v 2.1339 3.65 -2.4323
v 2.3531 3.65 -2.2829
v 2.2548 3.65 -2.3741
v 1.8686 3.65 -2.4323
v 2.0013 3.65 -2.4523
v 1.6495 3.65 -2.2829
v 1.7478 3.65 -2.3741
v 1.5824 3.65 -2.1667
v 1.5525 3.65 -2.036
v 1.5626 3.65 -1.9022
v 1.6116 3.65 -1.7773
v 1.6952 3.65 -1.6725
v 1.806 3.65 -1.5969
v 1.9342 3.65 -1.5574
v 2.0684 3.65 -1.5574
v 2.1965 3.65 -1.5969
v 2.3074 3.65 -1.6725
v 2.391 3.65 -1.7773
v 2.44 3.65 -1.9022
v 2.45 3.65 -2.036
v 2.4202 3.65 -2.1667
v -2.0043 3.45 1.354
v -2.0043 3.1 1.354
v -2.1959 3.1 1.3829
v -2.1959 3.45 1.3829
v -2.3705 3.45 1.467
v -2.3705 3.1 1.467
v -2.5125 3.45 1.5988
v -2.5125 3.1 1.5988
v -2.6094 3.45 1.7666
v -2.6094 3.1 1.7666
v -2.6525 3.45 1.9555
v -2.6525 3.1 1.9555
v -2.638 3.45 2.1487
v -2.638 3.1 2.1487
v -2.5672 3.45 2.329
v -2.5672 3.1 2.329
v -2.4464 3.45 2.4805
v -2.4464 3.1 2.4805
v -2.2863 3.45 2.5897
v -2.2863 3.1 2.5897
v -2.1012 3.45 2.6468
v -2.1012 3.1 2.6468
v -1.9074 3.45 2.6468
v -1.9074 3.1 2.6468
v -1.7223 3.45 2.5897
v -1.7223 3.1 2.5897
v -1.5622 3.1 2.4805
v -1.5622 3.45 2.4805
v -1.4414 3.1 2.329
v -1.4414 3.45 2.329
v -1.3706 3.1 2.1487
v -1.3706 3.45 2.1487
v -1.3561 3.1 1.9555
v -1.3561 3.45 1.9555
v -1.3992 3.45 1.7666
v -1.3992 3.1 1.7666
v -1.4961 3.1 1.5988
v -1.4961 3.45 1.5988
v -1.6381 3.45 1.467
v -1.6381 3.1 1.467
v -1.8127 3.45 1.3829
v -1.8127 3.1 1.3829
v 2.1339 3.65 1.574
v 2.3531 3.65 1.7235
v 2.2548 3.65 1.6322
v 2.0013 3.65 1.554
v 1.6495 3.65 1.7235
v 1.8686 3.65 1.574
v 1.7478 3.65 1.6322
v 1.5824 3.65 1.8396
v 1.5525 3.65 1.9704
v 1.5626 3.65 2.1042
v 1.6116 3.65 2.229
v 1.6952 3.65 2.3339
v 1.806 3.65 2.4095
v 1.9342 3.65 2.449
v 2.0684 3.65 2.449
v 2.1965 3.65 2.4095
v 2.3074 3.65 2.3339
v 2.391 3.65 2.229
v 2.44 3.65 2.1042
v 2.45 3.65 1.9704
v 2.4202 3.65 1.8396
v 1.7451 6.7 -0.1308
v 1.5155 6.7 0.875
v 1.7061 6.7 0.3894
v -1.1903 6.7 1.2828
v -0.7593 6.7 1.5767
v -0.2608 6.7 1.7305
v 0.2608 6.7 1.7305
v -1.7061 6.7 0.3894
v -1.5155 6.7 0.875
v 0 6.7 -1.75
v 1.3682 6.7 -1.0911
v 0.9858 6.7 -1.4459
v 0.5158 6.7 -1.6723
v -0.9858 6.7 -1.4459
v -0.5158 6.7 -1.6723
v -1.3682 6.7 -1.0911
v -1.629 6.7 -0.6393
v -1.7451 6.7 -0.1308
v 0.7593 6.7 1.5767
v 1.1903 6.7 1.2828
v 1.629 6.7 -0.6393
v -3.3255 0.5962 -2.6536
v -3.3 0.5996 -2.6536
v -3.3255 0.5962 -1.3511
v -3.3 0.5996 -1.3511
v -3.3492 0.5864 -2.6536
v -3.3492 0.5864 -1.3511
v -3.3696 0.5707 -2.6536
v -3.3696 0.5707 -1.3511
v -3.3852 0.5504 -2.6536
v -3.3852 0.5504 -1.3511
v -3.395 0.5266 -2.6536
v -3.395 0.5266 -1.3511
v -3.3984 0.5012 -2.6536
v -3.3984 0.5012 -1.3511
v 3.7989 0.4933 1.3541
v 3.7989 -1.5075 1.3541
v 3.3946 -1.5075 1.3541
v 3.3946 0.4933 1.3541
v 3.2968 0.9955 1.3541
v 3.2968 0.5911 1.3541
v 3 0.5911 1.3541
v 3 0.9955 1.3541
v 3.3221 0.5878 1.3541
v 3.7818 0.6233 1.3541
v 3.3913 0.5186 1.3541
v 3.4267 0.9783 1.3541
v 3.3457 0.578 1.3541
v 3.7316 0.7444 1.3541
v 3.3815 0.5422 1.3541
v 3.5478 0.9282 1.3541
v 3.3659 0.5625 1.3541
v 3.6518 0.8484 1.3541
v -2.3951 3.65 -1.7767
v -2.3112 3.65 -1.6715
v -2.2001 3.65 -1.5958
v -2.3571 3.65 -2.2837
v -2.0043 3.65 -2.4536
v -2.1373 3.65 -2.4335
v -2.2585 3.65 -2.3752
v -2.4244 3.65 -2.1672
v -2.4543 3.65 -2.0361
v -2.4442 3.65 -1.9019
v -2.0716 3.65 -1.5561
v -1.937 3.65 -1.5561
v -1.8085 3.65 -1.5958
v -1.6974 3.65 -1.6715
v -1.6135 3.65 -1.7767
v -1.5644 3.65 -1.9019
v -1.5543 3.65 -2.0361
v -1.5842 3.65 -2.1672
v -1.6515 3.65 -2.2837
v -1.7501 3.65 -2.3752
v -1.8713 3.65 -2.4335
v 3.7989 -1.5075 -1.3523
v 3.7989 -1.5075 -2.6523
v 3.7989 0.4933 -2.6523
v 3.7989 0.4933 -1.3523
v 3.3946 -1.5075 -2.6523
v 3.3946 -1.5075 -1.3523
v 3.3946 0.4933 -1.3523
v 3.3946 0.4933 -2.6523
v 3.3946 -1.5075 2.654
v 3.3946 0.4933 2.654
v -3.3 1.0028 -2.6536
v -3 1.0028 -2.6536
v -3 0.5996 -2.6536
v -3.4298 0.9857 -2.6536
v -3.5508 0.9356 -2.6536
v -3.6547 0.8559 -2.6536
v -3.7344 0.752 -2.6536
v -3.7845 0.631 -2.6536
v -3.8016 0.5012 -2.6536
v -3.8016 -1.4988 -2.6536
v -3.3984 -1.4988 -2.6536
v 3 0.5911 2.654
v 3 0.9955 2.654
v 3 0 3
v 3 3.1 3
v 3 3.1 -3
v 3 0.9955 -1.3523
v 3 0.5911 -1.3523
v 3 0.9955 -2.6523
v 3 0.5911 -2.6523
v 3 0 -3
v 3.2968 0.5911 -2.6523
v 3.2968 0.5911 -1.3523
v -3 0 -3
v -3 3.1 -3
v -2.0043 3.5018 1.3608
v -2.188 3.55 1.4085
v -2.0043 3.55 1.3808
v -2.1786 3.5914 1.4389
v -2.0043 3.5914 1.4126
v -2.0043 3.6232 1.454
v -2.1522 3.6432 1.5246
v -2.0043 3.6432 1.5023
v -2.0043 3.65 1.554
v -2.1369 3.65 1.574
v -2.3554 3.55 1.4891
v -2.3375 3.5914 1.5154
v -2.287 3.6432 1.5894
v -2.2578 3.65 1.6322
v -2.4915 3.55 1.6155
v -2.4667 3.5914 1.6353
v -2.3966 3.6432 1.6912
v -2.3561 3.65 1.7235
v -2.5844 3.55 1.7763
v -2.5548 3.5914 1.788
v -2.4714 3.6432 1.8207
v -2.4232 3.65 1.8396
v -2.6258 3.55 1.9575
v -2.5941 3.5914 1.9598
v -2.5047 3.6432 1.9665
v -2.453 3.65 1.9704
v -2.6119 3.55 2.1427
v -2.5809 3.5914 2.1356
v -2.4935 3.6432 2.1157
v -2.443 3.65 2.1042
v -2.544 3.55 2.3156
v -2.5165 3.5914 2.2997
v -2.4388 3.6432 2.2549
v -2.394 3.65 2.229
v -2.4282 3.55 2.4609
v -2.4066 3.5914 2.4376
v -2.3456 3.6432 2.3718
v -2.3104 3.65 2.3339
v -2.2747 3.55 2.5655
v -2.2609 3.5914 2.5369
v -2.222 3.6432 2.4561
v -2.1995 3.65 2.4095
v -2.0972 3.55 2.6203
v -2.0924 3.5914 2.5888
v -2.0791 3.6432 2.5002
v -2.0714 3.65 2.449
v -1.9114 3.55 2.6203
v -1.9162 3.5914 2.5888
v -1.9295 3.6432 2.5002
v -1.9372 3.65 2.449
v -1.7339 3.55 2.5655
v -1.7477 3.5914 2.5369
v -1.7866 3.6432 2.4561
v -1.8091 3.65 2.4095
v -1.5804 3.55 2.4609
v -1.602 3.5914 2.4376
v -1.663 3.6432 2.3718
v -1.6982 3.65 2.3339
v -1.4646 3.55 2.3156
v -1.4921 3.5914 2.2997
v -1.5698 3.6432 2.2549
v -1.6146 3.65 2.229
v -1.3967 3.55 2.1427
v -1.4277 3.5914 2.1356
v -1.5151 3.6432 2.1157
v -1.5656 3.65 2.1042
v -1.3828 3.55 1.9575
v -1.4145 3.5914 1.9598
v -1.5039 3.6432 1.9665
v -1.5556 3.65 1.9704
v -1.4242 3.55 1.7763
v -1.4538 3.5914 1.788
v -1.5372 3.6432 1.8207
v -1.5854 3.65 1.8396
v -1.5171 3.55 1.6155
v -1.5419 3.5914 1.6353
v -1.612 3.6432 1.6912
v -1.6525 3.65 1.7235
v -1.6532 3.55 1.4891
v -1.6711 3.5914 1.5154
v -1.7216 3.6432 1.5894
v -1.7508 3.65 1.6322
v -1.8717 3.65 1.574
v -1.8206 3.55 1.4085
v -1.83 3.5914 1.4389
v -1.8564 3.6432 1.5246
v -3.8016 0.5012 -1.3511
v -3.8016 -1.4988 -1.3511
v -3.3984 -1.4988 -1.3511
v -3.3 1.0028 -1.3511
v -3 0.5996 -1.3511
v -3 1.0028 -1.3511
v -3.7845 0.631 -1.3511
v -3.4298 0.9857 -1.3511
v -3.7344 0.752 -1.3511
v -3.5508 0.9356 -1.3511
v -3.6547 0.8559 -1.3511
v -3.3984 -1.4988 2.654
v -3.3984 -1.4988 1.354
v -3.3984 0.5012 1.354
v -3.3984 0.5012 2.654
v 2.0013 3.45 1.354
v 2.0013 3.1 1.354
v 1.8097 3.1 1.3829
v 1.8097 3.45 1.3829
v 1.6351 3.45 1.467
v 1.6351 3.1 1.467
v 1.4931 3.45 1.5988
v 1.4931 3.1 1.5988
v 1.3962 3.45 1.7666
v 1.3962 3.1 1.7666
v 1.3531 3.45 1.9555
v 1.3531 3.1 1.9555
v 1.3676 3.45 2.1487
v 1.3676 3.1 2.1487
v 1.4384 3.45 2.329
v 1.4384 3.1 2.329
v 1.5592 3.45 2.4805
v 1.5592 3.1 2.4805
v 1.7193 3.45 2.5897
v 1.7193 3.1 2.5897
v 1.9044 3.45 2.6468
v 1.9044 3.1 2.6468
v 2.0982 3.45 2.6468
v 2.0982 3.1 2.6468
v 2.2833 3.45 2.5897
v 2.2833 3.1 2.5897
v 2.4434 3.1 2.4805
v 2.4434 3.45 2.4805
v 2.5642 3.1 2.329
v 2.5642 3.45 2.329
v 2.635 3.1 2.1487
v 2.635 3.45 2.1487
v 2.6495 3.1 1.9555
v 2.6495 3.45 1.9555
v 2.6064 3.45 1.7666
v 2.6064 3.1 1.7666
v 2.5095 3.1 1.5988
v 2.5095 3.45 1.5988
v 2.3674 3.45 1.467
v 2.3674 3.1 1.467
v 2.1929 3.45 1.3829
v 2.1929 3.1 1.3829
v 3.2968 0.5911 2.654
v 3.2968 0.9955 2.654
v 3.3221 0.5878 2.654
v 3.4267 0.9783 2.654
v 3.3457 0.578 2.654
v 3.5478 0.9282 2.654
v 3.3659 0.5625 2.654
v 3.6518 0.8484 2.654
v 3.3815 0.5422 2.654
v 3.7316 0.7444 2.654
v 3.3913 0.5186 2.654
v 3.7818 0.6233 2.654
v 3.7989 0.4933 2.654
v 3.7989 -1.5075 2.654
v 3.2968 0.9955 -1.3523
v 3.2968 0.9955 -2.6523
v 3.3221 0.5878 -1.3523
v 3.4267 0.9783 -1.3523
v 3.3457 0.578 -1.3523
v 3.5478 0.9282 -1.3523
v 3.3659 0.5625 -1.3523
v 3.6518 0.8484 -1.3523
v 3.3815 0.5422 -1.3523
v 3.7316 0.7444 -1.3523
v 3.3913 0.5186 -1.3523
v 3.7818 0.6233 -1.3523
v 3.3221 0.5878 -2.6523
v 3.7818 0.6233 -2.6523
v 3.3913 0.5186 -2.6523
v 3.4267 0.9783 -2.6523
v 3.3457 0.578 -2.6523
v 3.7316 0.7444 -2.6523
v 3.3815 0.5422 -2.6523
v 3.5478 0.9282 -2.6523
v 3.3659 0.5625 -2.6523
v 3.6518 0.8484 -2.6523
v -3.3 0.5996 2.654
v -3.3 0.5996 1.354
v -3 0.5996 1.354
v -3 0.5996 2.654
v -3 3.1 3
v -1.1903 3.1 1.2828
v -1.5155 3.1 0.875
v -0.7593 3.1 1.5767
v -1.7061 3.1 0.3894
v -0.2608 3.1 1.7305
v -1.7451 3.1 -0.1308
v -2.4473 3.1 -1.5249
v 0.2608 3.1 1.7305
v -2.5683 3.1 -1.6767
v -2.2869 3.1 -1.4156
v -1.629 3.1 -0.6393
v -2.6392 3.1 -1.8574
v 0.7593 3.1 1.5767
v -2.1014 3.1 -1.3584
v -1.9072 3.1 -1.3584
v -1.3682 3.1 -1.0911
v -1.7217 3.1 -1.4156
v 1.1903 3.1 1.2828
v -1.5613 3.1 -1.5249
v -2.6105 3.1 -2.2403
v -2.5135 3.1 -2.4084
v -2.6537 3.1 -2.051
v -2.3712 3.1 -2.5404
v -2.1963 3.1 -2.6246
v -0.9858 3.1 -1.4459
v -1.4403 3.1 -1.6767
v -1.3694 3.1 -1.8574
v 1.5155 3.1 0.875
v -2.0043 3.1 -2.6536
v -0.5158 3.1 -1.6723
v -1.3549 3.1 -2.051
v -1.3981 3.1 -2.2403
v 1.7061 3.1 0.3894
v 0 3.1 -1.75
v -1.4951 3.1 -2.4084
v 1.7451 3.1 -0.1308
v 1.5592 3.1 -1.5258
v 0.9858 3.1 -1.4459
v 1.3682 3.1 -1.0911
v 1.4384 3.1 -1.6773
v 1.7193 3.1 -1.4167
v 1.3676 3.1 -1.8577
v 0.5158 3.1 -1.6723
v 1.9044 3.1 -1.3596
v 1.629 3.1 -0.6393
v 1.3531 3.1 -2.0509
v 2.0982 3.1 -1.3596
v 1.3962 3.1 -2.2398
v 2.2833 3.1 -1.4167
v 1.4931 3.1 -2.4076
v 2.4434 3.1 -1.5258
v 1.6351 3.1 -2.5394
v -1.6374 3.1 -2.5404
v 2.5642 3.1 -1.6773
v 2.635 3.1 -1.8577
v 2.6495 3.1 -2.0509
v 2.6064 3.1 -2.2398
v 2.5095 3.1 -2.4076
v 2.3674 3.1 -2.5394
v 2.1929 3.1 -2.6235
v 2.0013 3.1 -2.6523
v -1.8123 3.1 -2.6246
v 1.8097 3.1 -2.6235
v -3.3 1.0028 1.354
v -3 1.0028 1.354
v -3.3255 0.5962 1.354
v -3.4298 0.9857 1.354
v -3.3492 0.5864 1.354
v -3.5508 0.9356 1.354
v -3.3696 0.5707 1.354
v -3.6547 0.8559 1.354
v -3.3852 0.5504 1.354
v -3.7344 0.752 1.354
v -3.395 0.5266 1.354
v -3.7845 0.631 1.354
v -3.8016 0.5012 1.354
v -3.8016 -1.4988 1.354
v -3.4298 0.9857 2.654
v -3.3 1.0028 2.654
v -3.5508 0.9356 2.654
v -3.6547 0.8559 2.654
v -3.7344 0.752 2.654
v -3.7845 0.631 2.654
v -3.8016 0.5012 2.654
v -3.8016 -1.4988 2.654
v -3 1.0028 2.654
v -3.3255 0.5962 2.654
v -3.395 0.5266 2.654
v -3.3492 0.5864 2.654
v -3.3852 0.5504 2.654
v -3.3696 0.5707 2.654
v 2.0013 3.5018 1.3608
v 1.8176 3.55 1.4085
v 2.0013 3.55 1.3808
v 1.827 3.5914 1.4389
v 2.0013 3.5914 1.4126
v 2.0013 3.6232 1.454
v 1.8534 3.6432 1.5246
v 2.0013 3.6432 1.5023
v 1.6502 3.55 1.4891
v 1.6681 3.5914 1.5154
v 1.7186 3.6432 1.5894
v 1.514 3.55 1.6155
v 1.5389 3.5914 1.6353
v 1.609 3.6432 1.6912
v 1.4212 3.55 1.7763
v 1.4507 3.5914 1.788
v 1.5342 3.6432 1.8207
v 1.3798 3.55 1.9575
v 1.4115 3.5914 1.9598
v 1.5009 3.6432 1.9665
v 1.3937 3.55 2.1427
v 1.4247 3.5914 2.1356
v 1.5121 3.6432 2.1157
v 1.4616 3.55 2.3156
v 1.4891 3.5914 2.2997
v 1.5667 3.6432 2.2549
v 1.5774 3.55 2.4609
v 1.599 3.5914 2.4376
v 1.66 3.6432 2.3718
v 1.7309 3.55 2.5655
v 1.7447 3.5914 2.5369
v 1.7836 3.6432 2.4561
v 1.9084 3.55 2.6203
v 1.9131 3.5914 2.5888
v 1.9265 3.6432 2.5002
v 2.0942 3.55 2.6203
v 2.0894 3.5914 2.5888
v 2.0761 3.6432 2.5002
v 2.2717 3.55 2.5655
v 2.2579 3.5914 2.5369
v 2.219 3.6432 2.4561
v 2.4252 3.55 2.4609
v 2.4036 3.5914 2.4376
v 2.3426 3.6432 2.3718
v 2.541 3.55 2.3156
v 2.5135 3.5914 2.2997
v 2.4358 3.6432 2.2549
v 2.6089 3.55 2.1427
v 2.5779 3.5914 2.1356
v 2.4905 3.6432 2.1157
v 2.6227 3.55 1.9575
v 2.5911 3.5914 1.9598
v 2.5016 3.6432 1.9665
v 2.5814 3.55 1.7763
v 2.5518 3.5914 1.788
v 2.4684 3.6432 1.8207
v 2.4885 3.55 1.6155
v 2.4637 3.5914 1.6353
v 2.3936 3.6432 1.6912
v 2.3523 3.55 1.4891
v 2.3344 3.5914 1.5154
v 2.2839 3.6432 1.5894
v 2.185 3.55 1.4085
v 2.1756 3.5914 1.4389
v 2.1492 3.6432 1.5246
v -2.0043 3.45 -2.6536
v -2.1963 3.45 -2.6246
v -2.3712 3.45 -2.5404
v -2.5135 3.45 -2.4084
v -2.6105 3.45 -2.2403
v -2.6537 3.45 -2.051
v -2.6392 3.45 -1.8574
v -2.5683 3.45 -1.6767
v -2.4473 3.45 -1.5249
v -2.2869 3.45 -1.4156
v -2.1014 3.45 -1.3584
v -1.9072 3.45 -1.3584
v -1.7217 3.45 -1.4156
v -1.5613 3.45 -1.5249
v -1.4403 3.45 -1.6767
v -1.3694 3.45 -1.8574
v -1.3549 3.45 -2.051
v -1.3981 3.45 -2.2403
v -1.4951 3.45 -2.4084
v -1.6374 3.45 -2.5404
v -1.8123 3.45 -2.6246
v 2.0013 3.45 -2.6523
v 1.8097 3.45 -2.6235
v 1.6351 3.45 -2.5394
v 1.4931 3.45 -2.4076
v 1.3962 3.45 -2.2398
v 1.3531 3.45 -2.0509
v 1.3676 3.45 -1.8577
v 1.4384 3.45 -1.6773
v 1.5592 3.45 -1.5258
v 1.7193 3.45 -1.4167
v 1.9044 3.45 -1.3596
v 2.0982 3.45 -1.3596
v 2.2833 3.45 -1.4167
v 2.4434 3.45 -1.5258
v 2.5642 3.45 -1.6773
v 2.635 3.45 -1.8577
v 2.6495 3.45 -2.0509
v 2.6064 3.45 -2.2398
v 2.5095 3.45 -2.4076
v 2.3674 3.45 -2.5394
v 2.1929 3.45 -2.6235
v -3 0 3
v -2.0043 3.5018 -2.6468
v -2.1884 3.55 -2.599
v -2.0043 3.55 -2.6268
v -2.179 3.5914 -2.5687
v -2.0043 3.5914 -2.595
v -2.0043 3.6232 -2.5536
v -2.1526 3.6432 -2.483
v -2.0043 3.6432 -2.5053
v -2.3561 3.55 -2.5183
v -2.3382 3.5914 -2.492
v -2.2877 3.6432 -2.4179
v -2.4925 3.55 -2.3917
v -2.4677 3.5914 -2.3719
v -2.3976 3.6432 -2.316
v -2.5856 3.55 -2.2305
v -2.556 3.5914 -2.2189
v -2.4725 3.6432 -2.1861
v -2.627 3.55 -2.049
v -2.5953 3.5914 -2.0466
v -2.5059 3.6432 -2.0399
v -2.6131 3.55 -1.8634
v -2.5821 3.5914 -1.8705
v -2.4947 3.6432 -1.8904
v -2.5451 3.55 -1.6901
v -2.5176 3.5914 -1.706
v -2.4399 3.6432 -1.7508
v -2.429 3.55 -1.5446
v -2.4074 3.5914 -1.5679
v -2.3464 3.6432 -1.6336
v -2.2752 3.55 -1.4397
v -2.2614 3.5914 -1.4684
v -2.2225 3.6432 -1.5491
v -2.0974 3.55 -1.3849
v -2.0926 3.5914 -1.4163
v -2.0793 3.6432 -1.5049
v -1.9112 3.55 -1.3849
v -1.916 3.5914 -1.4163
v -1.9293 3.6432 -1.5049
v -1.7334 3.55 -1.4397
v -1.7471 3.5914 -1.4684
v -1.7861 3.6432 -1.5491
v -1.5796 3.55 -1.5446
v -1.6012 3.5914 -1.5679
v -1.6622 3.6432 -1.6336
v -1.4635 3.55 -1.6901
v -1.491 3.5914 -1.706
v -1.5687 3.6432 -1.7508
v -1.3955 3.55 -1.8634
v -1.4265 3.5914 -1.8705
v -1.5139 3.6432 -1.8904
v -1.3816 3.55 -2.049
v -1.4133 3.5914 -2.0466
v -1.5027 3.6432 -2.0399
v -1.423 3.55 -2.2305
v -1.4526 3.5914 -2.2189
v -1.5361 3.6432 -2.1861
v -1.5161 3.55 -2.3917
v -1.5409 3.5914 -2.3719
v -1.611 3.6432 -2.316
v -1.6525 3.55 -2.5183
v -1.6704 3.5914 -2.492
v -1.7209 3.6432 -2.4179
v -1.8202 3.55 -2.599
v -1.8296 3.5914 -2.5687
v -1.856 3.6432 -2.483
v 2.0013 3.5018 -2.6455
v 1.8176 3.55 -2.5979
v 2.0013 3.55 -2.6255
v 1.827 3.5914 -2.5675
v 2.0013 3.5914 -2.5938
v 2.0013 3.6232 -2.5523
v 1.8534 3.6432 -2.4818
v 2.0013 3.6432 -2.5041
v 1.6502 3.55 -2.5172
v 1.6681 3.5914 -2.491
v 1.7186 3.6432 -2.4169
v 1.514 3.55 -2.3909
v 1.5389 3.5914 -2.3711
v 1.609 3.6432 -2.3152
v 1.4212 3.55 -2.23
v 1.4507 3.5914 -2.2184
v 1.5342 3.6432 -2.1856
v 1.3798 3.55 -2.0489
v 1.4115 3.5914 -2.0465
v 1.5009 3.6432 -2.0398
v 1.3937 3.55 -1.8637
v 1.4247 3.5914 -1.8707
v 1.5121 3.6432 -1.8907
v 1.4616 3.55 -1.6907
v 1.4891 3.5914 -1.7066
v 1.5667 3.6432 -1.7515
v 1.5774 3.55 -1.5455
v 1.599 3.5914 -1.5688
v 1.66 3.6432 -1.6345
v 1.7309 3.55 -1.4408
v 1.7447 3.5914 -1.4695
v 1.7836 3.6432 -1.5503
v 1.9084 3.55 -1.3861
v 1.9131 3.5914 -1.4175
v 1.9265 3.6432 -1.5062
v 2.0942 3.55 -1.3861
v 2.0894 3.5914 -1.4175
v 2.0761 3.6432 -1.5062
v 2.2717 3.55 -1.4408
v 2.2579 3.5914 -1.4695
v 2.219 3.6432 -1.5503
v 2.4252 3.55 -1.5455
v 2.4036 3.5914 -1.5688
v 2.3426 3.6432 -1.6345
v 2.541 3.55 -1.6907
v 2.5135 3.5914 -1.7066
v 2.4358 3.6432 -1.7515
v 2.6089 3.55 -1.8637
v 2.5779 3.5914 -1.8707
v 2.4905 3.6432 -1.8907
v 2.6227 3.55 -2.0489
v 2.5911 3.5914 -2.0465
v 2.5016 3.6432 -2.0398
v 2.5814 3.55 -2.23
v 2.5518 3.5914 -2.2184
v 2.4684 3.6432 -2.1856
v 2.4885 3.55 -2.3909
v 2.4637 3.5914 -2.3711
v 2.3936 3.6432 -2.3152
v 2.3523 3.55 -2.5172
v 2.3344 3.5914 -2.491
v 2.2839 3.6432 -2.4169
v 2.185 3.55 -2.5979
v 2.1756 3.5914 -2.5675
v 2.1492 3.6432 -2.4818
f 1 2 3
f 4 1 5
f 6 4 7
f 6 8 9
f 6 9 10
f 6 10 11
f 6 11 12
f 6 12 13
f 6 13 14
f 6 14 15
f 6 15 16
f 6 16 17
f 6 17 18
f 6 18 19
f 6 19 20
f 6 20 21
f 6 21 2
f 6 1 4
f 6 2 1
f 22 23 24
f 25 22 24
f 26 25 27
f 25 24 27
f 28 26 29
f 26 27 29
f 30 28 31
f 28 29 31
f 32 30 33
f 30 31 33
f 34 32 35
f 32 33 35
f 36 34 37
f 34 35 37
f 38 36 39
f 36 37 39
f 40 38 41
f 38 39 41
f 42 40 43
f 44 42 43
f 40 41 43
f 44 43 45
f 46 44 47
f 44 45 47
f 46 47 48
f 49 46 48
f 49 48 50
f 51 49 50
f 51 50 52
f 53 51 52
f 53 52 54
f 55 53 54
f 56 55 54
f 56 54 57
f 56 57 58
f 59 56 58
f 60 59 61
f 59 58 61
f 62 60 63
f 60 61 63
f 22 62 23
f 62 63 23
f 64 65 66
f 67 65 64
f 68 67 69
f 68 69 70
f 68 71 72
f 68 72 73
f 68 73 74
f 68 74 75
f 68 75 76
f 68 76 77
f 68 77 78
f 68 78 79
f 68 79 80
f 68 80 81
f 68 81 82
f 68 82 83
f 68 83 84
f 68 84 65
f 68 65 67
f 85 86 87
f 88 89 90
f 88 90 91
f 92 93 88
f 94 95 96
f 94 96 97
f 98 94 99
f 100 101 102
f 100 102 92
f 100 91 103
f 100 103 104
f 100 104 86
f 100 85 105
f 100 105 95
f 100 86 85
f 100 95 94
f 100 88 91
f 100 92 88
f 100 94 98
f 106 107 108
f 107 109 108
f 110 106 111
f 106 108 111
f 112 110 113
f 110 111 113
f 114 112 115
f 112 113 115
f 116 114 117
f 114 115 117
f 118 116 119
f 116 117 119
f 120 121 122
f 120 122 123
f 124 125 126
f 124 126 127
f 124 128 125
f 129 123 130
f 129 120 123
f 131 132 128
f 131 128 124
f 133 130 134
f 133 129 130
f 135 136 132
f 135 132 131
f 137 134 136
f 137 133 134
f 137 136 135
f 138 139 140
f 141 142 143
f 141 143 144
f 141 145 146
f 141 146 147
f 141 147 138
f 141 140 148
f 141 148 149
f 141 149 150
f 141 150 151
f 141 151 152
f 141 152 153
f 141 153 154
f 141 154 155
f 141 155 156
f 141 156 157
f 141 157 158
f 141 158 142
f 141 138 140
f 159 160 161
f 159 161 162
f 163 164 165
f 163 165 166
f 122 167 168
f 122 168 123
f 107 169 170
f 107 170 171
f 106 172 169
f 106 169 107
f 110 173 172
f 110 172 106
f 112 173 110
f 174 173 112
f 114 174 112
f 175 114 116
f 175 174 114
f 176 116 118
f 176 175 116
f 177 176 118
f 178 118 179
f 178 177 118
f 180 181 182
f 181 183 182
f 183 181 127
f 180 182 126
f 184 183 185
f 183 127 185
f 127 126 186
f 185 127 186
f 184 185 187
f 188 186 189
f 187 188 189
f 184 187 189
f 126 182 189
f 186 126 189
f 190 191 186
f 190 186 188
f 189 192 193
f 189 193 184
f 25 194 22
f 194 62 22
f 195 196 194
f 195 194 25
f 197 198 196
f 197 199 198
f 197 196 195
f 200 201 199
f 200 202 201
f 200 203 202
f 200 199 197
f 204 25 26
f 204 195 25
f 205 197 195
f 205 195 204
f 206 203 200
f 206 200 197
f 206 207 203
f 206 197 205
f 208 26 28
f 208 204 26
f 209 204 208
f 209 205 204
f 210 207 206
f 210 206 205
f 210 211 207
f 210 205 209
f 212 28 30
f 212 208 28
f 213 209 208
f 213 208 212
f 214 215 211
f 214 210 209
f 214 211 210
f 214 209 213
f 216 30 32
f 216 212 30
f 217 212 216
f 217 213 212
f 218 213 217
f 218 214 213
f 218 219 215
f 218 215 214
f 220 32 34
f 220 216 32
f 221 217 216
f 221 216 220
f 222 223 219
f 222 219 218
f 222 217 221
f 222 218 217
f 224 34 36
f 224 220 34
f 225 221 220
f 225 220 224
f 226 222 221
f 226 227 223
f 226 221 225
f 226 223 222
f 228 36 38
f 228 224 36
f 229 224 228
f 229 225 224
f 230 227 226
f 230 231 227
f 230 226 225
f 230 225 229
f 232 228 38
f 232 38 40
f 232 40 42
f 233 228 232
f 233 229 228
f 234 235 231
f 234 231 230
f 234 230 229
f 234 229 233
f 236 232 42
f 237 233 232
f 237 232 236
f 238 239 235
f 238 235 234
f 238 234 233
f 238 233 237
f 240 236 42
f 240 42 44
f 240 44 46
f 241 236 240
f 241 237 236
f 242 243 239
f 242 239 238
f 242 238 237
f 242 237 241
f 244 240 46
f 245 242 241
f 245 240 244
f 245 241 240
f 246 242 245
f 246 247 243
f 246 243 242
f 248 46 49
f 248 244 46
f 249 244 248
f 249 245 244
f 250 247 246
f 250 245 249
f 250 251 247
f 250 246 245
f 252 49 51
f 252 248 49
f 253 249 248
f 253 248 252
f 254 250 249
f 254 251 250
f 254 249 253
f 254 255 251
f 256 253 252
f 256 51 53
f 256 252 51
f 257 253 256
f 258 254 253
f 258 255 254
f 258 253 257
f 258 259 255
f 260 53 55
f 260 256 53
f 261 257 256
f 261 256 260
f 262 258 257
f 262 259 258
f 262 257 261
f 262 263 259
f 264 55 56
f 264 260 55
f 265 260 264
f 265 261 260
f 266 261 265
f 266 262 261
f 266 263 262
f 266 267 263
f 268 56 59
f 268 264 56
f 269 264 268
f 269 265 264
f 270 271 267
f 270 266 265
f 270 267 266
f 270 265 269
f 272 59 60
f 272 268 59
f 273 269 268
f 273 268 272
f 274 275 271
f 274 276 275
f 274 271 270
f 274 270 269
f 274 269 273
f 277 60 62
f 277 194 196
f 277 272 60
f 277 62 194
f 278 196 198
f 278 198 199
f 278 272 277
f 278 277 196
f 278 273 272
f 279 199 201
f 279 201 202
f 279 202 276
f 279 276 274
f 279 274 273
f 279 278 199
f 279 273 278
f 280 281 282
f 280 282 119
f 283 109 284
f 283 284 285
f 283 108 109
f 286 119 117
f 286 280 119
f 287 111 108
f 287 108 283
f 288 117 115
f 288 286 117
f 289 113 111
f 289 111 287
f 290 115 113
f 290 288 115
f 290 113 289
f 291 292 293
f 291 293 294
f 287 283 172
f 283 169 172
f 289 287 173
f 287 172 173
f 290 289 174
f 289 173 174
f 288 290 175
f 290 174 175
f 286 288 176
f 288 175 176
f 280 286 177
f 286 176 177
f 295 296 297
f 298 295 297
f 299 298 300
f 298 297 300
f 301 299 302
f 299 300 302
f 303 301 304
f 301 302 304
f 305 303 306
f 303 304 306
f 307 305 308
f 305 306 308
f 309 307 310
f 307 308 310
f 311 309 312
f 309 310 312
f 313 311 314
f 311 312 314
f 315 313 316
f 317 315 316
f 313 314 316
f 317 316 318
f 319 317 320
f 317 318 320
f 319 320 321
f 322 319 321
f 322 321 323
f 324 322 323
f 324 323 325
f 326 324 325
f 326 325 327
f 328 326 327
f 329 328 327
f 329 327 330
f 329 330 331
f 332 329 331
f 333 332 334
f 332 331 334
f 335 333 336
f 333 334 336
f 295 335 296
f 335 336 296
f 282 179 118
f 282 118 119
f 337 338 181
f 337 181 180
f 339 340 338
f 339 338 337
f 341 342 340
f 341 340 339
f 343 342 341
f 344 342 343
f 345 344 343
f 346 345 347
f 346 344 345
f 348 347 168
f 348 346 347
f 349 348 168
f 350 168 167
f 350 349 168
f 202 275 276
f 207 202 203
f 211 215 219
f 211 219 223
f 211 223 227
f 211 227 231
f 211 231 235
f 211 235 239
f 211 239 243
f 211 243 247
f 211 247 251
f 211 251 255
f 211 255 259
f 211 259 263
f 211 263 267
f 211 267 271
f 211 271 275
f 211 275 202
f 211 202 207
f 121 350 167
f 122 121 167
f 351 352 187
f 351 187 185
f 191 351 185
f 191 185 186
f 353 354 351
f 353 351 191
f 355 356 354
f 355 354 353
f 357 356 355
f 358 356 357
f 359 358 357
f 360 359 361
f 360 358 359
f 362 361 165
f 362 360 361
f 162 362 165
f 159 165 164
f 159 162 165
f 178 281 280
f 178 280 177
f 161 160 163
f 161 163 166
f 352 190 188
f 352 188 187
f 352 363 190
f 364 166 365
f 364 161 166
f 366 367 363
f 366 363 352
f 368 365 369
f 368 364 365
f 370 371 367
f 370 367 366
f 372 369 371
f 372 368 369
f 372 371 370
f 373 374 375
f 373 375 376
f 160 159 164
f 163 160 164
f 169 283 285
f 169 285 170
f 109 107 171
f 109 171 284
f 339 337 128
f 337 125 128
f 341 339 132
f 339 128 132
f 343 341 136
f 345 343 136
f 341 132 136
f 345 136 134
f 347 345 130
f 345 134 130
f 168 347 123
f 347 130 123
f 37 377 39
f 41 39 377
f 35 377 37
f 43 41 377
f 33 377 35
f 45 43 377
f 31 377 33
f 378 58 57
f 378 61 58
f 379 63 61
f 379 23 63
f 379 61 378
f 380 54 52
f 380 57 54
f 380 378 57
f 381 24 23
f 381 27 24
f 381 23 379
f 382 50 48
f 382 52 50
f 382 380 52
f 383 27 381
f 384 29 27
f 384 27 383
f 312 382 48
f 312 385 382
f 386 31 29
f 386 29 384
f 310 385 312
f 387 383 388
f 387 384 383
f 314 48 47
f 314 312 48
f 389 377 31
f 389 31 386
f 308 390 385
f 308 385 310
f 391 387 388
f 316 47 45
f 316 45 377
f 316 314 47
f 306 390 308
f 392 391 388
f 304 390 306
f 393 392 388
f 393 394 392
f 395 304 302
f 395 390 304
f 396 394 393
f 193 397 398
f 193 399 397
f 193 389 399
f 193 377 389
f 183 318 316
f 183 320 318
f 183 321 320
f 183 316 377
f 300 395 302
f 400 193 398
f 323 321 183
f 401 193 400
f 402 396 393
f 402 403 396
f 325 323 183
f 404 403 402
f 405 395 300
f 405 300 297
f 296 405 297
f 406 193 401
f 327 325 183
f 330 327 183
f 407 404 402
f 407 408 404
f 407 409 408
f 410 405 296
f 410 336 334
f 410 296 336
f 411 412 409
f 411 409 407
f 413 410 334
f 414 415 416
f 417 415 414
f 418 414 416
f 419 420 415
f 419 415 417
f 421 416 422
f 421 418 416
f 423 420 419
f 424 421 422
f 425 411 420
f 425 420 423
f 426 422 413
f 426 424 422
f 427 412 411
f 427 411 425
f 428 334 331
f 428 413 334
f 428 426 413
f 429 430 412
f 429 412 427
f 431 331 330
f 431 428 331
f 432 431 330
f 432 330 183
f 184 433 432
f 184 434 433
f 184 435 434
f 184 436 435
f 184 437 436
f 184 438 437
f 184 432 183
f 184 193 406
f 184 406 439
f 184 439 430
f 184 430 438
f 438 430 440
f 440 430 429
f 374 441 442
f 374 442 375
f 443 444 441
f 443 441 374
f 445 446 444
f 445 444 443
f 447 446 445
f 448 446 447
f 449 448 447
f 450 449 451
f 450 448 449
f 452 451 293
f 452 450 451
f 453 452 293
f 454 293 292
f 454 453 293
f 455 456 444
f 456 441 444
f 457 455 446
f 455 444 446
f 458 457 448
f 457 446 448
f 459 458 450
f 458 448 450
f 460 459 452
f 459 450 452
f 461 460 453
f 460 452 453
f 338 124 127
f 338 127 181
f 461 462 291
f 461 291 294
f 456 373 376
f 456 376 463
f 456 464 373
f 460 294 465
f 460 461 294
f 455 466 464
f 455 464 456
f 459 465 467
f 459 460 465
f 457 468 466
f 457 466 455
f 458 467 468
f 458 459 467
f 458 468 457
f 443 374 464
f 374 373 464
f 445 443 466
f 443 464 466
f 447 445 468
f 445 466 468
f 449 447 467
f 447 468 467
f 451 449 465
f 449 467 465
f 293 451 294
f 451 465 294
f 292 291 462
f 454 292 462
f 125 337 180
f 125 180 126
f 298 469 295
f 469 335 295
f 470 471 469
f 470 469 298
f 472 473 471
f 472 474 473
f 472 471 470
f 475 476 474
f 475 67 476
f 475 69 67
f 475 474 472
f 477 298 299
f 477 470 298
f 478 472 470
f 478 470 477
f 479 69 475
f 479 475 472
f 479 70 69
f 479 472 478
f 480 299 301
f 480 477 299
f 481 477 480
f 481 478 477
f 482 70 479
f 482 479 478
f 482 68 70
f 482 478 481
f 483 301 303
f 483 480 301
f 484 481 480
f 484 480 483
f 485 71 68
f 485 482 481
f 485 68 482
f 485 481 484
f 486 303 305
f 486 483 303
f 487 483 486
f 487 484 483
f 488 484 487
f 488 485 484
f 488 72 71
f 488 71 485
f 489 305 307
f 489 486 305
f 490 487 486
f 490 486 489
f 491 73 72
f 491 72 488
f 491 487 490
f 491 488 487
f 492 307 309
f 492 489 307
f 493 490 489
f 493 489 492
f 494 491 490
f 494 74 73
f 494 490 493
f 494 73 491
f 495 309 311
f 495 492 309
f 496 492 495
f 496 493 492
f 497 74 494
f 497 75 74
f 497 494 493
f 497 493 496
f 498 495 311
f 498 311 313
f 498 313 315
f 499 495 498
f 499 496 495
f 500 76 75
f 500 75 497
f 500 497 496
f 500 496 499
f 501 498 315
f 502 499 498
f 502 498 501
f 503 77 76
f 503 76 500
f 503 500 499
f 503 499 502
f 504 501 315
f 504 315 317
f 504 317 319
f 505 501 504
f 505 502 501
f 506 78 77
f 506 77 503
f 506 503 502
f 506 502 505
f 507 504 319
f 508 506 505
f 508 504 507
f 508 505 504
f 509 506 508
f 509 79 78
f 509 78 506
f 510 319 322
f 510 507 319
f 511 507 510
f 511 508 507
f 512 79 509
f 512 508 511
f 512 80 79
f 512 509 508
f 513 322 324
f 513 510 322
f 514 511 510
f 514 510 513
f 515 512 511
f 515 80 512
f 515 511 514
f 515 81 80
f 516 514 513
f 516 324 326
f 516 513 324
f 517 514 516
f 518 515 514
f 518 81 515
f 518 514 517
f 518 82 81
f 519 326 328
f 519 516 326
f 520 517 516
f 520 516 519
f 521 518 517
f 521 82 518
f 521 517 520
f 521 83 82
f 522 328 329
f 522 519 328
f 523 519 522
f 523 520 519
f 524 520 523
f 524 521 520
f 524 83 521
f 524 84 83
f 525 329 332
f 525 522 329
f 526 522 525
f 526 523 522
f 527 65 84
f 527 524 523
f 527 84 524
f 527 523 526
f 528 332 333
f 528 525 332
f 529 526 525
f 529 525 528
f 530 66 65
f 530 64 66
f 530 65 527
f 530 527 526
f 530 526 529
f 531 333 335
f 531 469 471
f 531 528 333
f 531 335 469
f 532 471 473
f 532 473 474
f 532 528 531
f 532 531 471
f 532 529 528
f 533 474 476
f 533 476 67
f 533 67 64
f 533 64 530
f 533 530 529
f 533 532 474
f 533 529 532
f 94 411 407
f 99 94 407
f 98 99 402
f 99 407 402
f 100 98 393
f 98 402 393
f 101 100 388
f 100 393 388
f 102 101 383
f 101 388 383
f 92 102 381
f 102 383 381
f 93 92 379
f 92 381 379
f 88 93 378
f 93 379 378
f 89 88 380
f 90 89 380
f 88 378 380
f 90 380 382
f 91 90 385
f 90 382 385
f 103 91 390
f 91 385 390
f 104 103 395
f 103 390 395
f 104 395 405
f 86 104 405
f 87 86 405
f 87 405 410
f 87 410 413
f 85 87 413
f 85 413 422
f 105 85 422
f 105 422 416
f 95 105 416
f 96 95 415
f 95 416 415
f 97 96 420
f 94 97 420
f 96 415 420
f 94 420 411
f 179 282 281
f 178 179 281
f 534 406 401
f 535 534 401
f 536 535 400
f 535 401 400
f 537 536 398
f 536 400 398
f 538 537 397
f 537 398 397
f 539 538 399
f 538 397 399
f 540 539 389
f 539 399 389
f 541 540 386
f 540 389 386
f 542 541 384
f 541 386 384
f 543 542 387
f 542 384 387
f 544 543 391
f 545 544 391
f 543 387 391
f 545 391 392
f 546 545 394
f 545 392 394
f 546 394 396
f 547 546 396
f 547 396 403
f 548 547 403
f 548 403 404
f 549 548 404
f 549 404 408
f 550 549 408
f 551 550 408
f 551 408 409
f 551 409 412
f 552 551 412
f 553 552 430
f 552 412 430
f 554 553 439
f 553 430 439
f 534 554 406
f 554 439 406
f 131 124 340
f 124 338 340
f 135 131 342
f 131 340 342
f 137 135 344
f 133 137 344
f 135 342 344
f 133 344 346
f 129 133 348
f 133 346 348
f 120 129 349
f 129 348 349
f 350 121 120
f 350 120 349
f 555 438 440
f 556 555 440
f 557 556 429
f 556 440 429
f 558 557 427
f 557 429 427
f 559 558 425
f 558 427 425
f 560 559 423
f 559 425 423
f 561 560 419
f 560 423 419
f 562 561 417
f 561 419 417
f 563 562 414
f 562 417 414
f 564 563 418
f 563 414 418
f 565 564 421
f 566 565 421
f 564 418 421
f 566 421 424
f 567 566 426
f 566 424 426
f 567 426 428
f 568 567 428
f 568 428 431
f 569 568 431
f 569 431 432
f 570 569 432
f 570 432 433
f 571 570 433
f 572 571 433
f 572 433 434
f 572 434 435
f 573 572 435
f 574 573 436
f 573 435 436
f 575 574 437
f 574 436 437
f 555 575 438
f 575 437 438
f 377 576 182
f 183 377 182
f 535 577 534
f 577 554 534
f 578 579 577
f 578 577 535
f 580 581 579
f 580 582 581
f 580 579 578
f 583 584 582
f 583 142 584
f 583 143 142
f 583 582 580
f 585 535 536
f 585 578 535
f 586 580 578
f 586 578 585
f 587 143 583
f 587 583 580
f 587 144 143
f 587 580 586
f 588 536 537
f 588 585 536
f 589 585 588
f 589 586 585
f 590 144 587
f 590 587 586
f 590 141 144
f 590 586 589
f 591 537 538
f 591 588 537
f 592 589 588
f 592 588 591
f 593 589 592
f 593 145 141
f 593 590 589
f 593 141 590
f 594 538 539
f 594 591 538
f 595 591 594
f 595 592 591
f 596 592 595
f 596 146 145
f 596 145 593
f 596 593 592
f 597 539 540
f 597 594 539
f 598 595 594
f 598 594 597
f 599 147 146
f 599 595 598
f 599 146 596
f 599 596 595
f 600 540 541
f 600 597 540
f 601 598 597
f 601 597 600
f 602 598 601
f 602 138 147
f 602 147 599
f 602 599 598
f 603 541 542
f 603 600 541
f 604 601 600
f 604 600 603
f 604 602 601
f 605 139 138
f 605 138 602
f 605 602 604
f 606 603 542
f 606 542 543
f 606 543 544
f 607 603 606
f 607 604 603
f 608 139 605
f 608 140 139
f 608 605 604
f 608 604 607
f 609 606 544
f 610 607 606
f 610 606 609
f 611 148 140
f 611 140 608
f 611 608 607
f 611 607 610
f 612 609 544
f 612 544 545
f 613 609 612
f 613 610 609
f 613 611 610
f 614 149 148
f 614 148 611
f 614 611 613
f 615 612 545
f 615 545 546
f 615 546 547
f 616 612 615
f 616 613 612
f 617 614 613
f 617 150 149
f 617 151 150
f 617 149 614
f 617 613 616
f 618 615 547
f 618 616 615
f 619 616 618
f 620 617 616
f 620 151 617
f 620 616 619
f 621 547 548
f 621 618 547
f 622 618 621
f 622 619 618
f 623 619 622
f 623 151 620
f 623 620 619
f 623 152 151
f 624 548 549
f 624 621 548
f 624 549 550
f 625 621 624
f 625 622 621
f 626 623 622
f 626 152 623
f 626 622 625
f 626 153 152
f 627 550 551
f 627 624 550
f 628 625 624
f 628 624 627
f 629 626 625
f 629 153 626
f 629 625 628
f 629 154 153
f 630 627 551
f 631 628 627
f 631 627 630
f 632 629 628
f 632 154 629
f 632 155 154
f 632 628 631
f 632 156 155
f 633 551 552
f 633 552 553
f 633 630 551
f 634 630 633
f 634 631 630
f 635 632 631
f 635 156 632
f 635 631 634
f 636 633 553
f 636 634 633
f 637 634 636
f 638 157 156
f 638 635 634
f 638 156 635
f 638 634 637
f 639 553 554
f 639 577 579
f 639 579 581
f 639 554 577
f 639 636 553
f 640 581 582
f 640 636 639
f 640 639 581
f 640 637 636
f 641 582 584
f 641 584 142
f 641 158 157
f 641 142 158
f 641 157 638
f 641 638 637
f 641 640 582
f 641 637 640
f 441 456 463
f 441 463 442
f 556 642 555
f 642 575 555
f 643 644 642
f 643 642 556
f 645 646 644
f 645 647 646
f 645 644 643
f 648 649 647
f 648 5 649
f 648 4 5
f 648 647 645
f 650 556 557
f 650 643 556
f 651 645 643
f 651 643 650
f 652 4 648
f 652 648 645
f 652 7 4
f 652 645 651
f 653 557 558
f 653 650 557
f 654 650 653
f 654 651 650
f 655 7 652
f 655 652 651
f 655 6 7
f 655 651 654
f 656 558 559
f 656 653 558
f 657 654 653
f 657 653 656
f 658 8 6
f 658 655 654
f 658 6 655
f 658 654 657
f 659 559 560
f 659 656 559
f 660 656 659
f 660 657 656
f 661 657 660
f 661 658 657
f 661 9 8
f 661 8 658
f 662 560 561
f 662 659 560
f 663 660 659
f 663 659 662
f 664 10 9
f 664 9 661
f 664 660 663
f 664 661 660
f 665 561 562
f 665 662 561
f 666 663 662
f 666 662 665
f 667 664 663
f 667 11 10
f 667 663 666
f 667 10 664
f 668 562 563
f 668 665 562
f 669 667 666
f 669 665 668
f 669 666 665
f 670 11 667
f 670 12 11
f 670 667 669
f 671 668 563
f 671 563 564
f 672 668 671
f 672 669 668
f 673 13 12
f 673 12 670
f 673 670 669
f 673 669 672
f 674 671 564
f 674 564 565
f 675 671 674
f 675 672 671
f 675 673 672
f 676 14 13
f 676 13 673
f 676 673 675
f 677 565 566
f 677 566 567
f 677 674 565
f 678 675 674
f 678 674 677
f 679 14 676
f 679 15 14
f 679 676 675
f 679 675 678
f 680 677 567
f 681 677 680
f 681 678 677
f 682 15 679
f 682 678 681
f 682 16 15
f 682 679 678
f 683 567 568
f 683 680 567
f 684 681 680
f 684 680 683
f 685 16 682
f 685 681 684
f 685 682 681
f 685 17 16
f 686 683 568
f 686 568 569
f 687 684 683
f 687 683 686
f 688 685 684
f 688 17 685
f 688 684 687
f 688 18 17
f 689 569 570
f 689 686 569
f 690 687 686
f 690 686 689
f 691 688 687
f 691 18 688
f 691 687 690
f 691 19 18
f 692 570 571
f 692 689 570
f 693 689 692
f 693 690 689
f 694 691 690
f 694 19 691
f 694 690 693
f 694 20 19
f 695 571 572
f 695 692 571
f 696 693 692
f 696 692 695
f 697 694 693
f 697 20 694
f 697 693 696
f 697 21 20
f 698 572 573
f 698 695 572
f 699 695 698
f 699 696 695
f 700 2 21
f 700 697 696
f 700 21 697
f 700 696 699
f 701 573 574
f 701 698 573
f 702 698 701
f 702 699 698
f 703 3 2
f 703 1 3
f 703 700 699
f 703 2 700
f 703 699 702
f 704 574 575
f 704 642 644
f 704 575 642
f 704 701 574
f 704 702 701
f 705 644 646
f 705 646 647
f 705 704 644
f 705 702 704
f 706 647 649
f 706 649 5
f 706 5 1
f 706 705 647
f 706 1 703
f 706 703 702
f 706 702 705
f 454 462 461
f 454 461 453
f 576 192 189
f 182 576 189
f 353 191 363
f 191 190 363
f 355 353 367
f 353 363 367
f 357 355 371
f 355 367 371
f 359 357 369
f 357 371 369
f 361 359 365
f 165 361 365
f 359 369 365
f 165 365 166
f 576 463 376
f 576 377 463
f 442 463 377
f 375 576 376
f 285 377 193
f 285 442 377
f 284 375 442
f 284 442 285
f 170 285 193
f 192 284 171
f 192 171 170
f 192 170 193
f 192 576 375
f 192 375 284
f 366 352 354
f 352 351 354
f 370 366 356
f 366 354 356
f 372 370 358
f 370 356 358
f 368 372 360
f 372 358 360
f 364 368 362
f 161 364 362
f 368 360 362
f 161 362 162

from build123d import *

# Parameters (mm, degrees)
SKETCH_1_W      = 6
SKETCH_1_H      = 6
EXTRUDE_1_DEPTH = 3.1
SKETCH_2_R      = 1.75
EXTRUDE_2_DEPTH = 3.6
SKETCH_8_W      = 1.302494735
SKETCH_8_H      = 0.403244053
SKETCH_8_W_2    = 1.3
SKETCH_3_R      = 0.65
SKETCH_3_R_2    = 0.651247367
EXTRUDE_5_DEPTH = 0.55
FILLET_1_R      = 0.2
FILLET_2_R      = 0.2
FILLET_3_R      = 0.2
FILLET_4_R      = 0.2
SKETCH_13_W     = 1.29992486
SKETCH_13_H     = 0.404320481
SKETCH_13_W_2   = 1.3


with BuildPart() as part:
    # Эскиз1 → Бобышка-Вытянуть1 (new body)
    with BuildSketch(Plane(origin=(0, 0, 0), x_dir=(1, 0, 0), z_dir=(0, 1, 0))):
        Rectangle(SKETCH_1_W, SKETCH_1_H)
    extrude(amount=EXTRUDE_1_DEPTH)

    # Эскиз2 → Бобышка-Вытянуть2 (add)
    with BuildSketch(Plane(origin=(0, 3.1, 0), x_dir=(1, 0, 0), z_dir=(0, 1, 0))):
        with Locations(Location((0, 0, 0), (0, 0, 90))):
            Circle(SKETCH_2_R)
    extrude(amount=EXTRUDE_2_DEPTH)

    # По траектории11: sweep along a path in Эскиз11
    with BuildLine(Plane.XY) as sweep_11_path:
        Line((-3, 0.80118086), (-3.3, 0.80118086))
        ThreePointArc((-3.3, 0.80118086), (-3.512132034, 0.713312895), (-3.6, 0.50118086))
        Line((-3.6, 0.50118086), (-3.6, -1.49881914))
    # Эскиз8 → По траектории11 (sweep)
    with BuildSketch(Plane.ZY.offset(3)):
        with Locations((-2.002333521, 0.801180861)):
            Rectangle(SKETCH_8_W, SKETCH_8_H)
        with Locations((2.004025026, 0.801180861)):
            Rectangle(SKETCH_8_W_2, SKETCH_8_H)
    sweep(path=sweep_11_path.line)

    # Эскиз3 → Бобышка-Вытянуть5 (add)
    with BuildSketch(Plane(origin=(0, 3.1, 0), x_dir=(1, 0, 0), z_dir=(0, 1, 0))):
        with Locations(Location((-2.004298807, -2.004025026, 0), (0, 0, 90))):
            Circle(SKETCH_3_R)
        with Locations(Location((-2.004298807, 2.002333521, 0), (0, 0, 90))):
            Circle(SKETCH_3_R_2)
        with Locations(Location((2.001283613, 2.002333521, 0), (0, 0, 90))):
            Circle(SKETCH_3_R)
        with Locations(Location((2.001283613, -2.004025026, 0), (0, 0, 90))):
            Circle(SKETCH_3_R)
    extrude(amount=EXTRUDE_5_DEPTH)

    # Скругление1
    fillet_1_edges = [part.edges().sort_by_distance(p)[0] for p in [
        (2.001283613, 3.65, 2.654025026),
    ]]
    fillet(fillet_1_edges, radius=FILLET_1_R)

    # Скругление2
    fillet_2_edges = [part.edges().sort_by_distance(p)[0] for p in [
        (-2.004298807, 3.65, 2.654025026),
    ]]
    fillet(fillet_2_edges, radius=FILLET_2_R)

    # Скругление3
    fillet_3_edges = [part.edges().sort_by_distance(p)[0] for p in [
        (2.001283613, 3.65, -1.352333521),
    ]]
    fillet(fillet_3_edges, radius=FILLET_3_R)

    # Скругление4
    fillet_4_edges = [part.edges().sort_by_distance(p)[0] for p in [
        (-2.004298807, 3.65, -1.351086153),
    ]]
    fillet(fillet_4_edges, radius=FILLET_4_R)

    # По траектории12: sweep along a path in Эскиз14
    with BuildLine(Plane.XY) as sweep_12_path:
        Line((3, 0.793292299), (3.29676564, 0.793292299))
        ThreePointArc((3.29676564, 0.793292299), (3.508897675, 0.705424334), (3.59676564, 0.493292299))
        Line((3.59676564, 0.493292299), (3.59676564, -1.507497103))
    # Эскиз13 → По траектории12 (sweep)
    with BuildSketch(Plane(origin=(3, 0, 0), x_dir=(0, 0, -1), z_dir=(1, 0, 0))):
        with Locations((-2.004083718, 0.7932923)):
            Rectangle(SKETCH_13_W, SKETCH_13_H)
        with Locations((2.002333521, 0.7932923)):
            Rectangle(SKETCH_13_W_2, SKETCH_13_H)
    sweep(path=sweep_12_path.line)


solid = part.part
